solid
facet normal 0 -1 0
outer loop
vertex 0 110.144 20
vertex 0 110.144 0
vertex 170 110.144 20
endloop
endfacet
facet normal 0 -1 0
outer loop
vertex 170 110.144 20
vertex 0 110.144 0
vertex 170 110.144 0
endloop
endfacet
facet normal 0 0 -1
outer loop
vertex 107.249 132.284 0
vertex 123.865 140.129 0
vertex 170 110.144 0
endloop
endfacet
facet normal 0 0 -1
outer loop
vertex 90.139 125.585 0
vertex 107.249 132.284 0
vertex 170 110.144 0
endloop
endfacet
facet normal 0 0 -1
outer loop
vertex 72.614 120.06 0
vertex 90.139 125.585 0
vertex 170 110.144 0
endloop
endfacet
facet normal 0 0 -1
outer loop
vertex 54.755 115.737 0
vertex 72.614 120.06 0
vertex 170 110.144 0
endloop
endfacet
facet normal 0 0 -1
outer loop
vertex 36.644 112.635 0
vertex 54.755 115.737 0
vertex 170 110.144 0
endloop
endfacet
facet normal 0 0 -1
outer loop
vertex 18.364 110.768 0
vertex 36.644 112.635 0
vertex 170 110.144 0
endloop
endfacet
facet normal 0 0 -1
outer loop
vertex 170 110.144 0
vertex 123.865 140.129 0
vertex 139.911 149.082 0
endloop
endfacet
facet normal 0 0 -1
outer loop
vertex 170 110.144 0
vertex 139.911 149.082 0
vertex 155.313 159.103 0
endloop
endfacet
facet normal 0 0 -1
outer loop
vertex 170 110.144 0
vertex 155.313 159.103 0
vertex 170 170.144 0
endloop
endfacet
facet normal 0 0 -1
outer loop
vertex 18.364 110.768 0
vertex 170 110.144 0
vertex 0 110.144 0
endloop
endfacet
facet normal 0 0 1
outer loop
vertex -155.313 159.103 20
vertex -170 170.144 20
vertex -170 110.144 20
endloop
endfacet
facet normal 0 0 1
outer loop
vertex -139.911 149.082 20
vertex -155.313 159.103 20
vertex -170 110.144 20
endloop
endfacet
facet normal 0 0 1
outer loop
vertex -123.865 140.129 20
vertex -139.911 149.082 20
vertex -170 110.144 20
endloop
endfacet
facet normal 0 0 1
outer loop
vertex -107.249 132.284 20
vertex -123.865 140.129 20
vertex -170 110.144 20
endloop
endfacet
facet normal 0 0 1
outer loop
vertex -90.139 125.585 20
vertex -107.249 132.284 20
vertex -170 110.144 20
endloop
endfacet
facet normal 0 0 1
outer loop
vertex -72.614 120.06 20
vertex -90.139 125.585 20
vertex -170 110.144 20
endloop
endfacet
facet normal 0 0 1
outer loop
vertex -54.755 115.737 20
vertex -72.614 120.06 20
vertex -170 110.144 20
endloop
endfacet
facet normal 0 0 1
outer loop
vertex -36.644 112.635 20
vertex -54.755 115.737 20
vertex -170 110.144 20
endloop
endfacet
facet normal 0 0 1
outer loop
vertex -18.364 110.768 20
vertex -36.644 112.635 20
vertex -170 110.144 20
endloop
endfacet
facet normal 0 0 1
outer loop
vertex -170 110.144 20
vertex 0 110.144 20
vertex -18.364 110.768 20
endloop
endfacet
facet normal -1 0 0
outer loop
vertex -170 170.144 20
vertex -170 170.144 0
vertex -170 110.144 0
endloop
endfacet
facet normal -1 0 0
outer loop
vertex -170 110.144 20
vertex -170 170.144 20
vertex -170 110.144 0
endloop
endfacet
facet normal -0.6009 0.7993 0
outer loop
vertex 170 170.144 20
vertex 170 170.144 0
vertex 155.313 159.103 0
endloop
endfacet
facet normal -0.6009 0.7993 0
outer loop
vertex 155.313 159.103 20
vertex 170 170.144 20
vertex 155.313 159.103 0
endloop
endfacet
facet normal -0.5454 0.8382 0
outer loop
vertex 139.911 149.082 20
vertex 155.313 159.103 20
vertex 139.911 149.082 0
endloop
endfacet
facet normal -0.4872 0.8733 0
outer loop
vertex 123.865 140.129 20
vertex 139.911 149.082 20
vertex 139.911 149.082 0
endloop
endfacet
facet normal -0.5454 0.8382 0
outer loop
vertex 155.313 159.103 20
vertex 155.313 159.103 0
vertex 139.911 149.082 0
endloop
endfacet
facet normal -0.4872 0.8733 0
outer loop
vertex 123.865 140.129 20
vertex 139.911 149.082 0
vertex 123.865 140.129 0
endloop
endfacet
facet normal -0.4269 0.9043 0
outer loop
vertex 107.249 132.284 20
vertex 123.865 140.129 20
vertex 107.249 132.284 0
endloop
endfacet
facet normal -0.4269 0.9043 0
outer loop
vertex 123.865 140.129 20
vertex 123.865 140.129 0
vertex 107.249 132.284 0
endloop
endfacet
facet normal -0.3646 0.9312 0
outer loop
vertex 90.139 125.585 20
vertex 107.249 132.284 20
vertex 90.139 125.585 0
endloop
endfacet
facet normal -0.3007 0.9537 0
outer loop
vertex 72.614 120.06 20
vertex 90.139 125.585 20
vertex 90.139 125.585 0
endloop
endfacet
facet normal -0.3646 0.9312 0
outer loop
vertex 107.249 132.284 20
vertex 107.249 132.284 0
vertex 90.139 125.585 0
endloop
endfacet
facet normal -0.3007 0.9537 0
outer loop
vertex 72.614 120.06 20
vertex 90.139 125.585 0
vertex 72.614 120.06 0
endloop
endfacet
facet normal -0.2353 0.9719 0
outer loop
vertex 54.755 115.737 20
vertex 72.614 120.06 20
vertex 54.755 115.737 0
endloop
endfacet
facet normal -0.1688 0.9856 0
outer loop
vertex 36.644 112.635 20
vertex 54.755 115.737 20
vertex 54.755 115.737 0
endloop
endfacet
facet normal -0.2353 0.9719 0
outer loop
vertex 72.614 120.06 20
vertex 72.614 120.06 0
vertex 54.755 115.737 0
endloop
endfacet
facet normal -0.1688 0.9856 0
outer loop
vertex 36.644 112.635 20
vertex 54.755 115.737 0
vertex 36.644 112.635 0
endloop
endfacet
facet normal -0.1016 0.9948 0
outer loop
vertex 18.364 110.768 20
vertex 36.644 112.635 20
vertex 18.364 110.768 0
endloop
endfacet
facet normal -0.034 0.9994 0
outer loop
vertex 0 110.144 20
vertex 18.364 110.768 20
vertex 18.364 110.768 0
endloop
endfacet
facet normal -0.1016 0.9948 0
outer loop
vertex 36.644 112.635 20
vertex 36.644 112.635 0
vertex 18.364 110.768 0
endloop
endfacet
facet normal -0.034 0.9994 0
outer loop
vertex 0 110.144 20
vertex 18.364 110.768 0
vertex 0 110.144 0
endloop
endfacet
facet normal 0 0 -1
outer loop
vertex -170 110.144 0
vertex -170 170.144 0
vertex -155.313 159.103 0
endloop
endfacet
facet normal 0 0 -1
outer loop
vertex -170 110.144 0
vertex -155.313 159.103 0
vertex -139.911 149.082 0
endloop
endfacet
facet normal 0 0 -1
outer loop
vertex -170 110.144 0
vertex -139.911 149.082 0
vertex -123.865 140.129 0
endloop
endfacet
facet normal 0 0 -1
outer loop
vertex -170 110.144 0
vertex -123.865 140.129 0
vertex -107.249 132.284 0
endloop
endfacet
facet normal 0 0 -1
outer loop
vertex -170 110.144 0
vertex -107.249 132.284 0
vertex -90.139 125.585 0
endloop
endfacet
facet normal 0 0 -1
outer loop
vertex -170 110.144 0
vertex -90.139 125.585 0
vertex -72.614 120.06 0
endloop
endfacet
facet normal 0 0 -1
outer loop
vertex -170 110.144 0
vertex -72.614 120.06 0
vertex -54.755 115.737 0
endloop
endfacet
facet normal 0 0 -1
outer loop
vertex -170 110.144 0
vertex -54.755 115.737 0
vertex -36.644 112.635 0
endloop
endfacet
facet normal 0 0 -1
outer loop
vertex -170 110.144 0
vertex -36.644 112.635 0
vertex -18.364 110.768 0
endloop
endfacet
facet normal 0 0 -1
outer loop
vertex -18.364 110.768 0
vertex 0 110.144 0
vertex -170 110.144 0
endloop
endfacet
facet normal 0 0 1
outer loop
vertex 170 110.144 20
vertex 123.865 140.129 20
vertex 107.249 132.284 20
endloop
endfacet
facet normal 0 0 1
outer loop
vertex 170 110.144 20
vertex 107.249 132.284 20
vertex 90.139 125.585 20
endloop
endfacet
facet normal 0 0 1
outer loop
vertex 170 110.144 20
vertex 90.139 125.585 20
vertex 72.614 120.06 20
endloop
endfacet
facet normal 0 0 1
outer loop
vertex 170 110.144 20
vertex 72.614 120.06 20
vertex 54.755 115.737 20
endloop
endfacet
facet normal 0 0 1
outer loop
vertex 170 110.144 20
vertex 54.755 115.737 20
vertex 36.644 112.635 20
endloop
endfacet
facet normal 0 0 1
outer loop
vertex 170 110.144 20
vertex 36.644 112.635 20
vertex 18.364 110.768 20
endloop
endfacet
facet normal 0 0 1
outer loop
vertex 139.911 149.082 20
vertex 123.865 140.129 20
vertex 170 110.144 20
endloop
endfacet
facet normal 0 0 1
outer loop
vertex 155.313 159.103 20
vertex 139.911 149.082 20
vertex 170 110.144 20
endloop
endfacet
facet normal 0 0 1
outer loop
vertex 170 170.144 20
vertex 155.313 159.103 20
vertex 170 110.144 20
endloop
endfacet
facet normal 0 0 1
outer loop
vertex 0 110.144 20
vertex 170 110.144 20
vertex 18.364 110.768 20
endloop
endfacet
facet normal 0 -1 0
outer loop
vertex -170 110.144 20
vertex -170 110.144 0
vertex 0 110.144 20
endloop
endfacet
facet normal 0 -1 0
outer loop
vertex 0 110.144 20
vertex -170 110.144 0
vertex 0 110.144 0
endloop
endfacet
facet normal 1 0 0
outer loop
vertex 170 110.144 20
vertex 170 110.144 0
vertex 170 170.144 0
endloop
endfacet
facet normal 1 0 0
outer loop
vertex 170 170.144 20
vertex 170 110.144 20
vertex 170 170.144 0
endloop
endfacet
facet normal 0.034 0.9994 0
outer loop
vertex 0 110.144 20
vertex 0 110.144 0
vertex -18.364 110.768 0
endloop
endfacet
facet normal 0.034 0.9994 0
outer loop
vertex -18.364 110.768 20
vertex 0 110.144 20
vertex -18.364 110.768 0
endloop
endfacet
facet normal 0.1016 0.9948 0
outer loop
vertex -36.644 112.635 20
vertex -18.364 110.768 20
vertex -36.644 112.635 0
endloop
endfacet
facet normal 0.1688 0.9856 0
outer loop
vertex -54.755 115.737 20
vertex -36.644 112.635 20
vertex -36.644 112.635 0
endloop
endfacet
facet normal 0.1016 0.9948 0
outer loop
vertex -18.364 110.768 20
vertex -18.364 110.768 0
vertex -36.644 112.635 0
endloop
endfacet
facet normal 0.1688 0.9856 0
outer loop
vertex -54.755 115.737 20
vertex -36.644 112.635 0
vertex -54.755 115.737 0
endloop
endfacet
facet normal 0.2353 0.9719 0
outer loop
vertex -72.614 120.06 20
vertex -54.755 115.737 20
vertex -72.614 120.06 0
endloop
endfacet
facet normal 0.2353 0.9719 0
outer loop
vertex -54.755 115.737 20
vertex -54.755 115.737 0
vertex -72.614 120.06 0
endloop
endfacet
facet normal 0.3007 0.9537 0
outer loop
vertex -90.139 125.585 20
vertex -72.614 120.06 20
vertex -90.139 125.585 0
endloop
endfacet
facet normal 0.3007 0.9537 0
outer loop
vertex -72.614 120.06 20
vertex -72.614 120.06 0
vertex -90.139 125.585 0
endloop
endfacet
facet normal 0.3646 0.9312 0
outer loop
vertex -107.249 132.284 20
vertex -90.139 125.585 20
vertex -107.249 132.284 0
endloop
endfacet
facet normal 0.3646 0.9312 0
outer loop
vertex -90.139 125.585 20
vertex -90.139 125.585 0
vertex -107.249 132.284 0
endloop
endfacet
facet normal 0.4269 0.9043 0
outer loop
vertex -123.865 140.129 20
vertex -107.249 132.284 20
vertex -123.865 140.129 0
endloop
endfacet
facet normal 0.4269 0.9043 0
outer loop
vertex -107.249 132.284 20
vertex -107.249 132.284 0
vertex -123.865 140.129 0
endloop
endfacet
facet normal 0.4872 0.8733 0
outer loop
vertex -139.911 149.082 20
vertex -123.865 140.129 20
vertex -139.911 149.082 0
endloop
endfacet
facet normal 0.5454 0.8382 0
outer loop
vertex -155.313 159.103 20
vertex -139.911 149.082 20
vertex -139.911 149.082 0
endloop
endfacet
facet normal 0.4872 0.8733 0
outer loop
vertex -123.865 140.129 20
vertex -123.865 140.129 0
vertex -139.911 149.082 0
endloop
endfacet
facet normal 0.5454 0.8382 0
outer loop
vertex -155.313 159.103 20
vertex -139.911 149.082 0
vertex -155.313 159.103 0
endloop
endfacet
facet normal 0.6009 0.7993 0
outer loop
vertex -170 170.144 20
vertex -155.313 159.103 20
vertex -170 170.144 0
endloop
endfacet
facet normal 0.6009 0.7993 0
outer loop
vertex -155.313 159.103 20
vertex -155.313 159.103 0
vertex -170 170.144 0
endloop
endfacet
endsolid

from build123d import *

# Parameters (mm, degrees)
BOSS_EXTRUDE1_DEPTH   = 20
BOSS_EXTRUDE1_2_DEPTH = 20


with BuildPart() as part:
    # Sketch1 → Boss-Extrude1 (new body)
    with BuildSketch(Plane.XY):
        with BuildLine():
            ThreePointArc((5.88e-07, 110.144459885), (-90.138781609, 125.584577775), (-170, 170.144459885))
            Line((-170, 170.144459885), (-170, 110.144459885))
            Line((-170, 110.144459885), (5.88e-07, 110.144459885))
        make_face()
    extrude(amount=BOSS_EXTRUDE1_DEPTH)


with BuildPart() as body_2:
    # Sketch1 → Boss-Extrude1 2 (new body)
    with BuildSketch(Plane.XY):
        with BuildLine():
            ThreePointArc((170, 170.144459885), (90.138782164, 125.584577971), (5.88e-07, 110.144459885))
            Line((5.88e-07, 110.144459885), (170, 110.144459885))
            Line((170, 110.144459885), (170, 170.144459885))
        make_face()
    extrude(amount=BOSS_EXTRUDE1_2_DEPTH)


solid = Compound([part.part, body_2.part])
